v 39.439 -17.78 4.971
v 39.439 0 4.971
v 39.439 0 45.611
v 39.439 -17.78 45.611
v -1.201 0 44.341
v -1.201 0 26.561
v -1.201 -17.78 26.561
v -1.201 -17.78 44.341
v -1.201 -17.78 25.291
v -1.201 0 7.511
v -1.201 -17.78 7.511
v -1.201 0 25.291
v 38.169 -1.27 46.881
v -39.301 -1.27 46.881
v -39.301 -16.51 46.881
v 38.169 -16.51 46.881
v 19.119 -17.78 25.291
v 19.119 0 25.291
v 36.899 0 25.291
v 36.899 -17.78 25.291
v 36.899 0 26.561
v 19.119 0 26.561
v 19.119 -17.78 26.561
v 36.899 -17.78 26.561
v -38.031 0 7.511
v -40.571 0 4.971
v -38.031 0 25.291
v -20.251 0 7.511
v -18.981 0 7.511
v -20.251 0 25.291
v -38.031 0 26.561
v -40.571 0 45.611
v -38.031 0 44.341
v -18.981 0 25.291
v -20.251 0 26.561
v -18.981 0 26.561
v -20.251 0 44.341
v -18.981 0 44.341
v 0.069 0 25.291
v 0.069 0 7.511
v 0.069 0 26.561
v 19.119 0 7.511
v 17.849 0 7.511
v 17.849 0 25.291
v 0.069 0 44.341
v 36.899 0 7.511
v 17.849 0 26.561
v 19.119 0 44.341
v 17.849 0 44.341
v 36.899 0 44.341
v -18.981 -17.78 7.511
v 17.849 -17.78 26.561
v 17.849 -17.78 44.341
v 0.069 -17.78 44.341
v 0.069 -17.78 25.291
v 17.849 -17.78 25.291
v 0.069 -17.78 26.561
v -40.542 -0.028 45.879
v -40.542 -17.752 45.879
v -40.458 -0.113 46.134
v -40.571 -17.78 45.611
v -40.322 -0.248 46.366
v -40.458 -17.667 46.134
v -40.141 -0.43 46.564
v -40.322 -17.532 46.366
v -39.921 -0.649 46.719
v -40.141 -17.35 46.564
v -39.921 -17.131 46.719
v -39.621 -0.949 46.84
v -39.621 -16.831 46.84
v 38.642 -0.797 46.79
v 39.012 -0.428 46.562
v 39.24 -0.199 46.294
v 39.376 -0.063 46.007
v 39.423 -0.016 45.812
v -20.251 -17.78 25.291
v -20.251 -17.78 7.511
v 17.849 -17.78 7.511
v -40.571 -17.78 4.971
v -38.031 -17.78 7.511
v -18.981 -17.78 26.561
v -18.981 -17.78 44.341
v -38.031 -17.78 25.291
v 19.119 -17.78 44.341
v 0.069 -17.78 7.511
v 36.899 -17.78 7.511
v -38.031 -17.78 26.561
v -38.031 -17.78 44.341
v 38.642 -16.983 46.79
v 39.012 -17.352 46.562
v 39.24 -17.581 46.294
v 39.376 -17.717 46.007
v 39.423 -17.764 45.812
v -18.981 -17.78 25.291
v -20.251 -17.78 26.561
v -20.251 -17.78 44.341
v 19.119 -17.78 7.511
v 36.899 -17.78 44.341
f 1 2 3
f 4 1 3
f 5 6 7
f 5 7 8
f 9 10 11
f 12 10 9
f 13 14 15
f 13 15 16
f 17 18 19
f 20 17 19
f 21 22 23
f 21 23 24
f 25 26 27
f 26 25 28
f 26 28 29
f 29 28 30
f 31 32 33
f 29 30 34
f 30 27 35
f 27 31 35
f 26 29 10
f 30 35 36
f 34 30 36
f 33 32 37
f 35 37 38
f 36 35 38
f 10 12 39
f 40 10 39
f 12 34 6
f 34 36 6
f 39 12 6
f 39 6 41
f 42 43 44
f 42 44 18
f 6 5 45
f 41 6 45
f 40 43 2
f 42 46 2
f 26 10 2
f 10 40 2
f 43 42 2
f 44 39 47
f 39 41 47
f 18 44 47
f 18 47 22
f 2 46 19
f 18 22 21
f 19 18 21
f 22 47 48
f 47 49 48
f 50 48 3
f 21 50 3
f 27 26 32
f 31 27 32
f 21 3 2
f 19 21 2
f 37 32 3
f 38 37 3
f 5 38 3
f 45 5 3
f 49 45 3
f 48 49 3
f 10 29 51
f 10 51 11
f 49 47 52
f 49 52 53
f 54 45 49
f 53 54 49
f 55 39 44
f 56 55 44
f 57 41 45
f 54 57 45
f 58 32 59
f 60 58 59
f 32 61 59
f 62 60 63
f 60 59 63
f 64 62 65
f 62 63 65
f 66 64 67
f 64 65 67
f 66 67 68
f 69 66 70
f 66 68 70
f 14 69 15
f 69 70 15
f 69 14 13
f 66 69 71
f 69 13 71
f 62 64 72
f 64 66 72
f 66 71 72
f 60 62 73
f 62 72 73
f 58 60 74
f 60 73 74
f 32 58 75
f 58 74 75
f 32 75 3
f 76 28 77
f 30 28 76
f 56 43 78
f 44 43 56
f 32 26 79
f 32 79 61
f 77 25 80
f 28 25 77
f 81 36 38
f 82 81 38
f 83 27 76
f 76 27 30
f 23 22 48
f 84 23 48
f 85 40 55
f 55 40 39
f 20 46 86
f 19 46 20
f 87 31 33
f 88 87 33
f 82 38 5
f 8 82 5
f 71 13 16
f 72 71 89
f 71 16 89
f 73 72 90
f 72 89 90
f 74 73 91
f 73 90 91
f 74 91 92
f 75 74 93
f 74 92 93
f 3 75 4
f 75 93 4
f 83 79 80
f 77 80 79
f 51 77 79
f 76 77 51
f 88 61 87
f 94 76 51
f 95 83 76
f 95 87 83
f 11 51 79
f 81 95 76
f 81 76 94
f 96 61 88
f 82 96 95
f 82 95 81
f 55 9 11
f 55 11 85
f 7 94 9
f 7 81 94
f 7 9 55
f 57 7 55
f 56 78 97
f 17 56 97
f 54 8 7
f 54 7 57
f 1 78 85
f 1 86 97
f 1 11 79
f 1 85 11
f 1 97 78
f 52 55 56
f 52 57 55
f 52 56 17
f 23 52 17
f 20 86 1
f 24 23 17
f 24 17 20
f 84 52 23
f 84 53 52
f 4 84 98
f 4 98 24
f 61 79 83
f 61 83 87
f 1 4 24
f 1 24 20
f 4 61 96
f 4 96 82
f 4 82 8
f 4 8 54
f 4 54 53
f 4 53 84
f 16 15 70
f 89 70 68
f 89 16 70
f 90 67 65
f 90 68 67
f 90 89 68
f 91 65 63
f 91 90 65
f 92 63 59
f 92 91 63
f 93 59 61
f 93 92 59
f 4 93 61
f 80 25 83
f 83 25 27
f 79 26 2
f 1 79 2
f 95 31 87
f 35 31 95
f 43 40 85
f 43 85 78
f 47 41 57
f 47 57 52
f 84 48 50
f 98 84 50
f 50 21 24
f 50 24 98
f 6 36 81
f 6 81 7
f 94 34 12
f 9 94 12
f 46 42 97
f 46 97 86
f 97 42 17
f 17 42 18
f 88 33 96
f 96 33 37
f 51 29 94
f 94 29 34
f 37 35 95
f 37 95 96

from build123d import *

# Parameters (mm, degrees)
F0_W     = 80.01
F0_H     = 41.91
F0_W_2   = 17.78
F0_H_2   = 17.78
F1_DEPTH = 17.78
F2_R     = 1.27


with BuildPart() as f1:
    # F0 (on Front) → F1 (new body)
    with BuildSketch(Plane.XZ):
        with Locations((-0.565825, 25.926393)):
            Rectangle(F0_W, F0_H)
        with Locations((-29.140825, 16.401393)):
            Rectangle(F0_W_2, F0_H_2, mode=Mode.SUBTRACT)
        with Locations((-10.090825, 16.401393)):
            Rectangle(F0_W_2, F0_H_2, mode=Mode.SUBTRACT)
        with Locations((8.959175, 16.401393)):
            Rectangle(F0_W_2, F0_H_2, mode=Mode.SUBTRACT)
        with Locations((28.009175, 16.401393)):
            Rectangle(F0_W_2, F0_H_2, mode=Mode.SUBTRACT)
        with Locations((-29.140825, 35.451393)):
            Rectangle(F0_W_2, F0_H_2, mode=Mode.SUBTRACT)
        with Locations((-10.090825, 35.451393)):
            Rectangle(F0_W_2, F0_H_2, mode=Mode.SUBTRACT)
        with Locations((8.959175, 35.451393)):
            Rectangle(F0_W_2, F0_H_2, mode=Mode.SUBTRACT)
        with Locations((28.009175, 35.451393)):
            Rectangle(F0_W_2, F0_H_2, mode=Mode.SUBTRACT)
    extrude(amount=F1_DEPTH)

    # F2
    f2_edges = [f1.edges().sort_by_distance(p)[0] for p in [
        (39.439175, -8.89, 46.881393),
        (-40.570825, -8.89, 46.881393),
        (-0.565825, 0, 46.881393),
        (-0.565825, -17.78, 46.881393),
    ]]
    fillet(f2_edges, radius=F2_R)


solid = f1.part
